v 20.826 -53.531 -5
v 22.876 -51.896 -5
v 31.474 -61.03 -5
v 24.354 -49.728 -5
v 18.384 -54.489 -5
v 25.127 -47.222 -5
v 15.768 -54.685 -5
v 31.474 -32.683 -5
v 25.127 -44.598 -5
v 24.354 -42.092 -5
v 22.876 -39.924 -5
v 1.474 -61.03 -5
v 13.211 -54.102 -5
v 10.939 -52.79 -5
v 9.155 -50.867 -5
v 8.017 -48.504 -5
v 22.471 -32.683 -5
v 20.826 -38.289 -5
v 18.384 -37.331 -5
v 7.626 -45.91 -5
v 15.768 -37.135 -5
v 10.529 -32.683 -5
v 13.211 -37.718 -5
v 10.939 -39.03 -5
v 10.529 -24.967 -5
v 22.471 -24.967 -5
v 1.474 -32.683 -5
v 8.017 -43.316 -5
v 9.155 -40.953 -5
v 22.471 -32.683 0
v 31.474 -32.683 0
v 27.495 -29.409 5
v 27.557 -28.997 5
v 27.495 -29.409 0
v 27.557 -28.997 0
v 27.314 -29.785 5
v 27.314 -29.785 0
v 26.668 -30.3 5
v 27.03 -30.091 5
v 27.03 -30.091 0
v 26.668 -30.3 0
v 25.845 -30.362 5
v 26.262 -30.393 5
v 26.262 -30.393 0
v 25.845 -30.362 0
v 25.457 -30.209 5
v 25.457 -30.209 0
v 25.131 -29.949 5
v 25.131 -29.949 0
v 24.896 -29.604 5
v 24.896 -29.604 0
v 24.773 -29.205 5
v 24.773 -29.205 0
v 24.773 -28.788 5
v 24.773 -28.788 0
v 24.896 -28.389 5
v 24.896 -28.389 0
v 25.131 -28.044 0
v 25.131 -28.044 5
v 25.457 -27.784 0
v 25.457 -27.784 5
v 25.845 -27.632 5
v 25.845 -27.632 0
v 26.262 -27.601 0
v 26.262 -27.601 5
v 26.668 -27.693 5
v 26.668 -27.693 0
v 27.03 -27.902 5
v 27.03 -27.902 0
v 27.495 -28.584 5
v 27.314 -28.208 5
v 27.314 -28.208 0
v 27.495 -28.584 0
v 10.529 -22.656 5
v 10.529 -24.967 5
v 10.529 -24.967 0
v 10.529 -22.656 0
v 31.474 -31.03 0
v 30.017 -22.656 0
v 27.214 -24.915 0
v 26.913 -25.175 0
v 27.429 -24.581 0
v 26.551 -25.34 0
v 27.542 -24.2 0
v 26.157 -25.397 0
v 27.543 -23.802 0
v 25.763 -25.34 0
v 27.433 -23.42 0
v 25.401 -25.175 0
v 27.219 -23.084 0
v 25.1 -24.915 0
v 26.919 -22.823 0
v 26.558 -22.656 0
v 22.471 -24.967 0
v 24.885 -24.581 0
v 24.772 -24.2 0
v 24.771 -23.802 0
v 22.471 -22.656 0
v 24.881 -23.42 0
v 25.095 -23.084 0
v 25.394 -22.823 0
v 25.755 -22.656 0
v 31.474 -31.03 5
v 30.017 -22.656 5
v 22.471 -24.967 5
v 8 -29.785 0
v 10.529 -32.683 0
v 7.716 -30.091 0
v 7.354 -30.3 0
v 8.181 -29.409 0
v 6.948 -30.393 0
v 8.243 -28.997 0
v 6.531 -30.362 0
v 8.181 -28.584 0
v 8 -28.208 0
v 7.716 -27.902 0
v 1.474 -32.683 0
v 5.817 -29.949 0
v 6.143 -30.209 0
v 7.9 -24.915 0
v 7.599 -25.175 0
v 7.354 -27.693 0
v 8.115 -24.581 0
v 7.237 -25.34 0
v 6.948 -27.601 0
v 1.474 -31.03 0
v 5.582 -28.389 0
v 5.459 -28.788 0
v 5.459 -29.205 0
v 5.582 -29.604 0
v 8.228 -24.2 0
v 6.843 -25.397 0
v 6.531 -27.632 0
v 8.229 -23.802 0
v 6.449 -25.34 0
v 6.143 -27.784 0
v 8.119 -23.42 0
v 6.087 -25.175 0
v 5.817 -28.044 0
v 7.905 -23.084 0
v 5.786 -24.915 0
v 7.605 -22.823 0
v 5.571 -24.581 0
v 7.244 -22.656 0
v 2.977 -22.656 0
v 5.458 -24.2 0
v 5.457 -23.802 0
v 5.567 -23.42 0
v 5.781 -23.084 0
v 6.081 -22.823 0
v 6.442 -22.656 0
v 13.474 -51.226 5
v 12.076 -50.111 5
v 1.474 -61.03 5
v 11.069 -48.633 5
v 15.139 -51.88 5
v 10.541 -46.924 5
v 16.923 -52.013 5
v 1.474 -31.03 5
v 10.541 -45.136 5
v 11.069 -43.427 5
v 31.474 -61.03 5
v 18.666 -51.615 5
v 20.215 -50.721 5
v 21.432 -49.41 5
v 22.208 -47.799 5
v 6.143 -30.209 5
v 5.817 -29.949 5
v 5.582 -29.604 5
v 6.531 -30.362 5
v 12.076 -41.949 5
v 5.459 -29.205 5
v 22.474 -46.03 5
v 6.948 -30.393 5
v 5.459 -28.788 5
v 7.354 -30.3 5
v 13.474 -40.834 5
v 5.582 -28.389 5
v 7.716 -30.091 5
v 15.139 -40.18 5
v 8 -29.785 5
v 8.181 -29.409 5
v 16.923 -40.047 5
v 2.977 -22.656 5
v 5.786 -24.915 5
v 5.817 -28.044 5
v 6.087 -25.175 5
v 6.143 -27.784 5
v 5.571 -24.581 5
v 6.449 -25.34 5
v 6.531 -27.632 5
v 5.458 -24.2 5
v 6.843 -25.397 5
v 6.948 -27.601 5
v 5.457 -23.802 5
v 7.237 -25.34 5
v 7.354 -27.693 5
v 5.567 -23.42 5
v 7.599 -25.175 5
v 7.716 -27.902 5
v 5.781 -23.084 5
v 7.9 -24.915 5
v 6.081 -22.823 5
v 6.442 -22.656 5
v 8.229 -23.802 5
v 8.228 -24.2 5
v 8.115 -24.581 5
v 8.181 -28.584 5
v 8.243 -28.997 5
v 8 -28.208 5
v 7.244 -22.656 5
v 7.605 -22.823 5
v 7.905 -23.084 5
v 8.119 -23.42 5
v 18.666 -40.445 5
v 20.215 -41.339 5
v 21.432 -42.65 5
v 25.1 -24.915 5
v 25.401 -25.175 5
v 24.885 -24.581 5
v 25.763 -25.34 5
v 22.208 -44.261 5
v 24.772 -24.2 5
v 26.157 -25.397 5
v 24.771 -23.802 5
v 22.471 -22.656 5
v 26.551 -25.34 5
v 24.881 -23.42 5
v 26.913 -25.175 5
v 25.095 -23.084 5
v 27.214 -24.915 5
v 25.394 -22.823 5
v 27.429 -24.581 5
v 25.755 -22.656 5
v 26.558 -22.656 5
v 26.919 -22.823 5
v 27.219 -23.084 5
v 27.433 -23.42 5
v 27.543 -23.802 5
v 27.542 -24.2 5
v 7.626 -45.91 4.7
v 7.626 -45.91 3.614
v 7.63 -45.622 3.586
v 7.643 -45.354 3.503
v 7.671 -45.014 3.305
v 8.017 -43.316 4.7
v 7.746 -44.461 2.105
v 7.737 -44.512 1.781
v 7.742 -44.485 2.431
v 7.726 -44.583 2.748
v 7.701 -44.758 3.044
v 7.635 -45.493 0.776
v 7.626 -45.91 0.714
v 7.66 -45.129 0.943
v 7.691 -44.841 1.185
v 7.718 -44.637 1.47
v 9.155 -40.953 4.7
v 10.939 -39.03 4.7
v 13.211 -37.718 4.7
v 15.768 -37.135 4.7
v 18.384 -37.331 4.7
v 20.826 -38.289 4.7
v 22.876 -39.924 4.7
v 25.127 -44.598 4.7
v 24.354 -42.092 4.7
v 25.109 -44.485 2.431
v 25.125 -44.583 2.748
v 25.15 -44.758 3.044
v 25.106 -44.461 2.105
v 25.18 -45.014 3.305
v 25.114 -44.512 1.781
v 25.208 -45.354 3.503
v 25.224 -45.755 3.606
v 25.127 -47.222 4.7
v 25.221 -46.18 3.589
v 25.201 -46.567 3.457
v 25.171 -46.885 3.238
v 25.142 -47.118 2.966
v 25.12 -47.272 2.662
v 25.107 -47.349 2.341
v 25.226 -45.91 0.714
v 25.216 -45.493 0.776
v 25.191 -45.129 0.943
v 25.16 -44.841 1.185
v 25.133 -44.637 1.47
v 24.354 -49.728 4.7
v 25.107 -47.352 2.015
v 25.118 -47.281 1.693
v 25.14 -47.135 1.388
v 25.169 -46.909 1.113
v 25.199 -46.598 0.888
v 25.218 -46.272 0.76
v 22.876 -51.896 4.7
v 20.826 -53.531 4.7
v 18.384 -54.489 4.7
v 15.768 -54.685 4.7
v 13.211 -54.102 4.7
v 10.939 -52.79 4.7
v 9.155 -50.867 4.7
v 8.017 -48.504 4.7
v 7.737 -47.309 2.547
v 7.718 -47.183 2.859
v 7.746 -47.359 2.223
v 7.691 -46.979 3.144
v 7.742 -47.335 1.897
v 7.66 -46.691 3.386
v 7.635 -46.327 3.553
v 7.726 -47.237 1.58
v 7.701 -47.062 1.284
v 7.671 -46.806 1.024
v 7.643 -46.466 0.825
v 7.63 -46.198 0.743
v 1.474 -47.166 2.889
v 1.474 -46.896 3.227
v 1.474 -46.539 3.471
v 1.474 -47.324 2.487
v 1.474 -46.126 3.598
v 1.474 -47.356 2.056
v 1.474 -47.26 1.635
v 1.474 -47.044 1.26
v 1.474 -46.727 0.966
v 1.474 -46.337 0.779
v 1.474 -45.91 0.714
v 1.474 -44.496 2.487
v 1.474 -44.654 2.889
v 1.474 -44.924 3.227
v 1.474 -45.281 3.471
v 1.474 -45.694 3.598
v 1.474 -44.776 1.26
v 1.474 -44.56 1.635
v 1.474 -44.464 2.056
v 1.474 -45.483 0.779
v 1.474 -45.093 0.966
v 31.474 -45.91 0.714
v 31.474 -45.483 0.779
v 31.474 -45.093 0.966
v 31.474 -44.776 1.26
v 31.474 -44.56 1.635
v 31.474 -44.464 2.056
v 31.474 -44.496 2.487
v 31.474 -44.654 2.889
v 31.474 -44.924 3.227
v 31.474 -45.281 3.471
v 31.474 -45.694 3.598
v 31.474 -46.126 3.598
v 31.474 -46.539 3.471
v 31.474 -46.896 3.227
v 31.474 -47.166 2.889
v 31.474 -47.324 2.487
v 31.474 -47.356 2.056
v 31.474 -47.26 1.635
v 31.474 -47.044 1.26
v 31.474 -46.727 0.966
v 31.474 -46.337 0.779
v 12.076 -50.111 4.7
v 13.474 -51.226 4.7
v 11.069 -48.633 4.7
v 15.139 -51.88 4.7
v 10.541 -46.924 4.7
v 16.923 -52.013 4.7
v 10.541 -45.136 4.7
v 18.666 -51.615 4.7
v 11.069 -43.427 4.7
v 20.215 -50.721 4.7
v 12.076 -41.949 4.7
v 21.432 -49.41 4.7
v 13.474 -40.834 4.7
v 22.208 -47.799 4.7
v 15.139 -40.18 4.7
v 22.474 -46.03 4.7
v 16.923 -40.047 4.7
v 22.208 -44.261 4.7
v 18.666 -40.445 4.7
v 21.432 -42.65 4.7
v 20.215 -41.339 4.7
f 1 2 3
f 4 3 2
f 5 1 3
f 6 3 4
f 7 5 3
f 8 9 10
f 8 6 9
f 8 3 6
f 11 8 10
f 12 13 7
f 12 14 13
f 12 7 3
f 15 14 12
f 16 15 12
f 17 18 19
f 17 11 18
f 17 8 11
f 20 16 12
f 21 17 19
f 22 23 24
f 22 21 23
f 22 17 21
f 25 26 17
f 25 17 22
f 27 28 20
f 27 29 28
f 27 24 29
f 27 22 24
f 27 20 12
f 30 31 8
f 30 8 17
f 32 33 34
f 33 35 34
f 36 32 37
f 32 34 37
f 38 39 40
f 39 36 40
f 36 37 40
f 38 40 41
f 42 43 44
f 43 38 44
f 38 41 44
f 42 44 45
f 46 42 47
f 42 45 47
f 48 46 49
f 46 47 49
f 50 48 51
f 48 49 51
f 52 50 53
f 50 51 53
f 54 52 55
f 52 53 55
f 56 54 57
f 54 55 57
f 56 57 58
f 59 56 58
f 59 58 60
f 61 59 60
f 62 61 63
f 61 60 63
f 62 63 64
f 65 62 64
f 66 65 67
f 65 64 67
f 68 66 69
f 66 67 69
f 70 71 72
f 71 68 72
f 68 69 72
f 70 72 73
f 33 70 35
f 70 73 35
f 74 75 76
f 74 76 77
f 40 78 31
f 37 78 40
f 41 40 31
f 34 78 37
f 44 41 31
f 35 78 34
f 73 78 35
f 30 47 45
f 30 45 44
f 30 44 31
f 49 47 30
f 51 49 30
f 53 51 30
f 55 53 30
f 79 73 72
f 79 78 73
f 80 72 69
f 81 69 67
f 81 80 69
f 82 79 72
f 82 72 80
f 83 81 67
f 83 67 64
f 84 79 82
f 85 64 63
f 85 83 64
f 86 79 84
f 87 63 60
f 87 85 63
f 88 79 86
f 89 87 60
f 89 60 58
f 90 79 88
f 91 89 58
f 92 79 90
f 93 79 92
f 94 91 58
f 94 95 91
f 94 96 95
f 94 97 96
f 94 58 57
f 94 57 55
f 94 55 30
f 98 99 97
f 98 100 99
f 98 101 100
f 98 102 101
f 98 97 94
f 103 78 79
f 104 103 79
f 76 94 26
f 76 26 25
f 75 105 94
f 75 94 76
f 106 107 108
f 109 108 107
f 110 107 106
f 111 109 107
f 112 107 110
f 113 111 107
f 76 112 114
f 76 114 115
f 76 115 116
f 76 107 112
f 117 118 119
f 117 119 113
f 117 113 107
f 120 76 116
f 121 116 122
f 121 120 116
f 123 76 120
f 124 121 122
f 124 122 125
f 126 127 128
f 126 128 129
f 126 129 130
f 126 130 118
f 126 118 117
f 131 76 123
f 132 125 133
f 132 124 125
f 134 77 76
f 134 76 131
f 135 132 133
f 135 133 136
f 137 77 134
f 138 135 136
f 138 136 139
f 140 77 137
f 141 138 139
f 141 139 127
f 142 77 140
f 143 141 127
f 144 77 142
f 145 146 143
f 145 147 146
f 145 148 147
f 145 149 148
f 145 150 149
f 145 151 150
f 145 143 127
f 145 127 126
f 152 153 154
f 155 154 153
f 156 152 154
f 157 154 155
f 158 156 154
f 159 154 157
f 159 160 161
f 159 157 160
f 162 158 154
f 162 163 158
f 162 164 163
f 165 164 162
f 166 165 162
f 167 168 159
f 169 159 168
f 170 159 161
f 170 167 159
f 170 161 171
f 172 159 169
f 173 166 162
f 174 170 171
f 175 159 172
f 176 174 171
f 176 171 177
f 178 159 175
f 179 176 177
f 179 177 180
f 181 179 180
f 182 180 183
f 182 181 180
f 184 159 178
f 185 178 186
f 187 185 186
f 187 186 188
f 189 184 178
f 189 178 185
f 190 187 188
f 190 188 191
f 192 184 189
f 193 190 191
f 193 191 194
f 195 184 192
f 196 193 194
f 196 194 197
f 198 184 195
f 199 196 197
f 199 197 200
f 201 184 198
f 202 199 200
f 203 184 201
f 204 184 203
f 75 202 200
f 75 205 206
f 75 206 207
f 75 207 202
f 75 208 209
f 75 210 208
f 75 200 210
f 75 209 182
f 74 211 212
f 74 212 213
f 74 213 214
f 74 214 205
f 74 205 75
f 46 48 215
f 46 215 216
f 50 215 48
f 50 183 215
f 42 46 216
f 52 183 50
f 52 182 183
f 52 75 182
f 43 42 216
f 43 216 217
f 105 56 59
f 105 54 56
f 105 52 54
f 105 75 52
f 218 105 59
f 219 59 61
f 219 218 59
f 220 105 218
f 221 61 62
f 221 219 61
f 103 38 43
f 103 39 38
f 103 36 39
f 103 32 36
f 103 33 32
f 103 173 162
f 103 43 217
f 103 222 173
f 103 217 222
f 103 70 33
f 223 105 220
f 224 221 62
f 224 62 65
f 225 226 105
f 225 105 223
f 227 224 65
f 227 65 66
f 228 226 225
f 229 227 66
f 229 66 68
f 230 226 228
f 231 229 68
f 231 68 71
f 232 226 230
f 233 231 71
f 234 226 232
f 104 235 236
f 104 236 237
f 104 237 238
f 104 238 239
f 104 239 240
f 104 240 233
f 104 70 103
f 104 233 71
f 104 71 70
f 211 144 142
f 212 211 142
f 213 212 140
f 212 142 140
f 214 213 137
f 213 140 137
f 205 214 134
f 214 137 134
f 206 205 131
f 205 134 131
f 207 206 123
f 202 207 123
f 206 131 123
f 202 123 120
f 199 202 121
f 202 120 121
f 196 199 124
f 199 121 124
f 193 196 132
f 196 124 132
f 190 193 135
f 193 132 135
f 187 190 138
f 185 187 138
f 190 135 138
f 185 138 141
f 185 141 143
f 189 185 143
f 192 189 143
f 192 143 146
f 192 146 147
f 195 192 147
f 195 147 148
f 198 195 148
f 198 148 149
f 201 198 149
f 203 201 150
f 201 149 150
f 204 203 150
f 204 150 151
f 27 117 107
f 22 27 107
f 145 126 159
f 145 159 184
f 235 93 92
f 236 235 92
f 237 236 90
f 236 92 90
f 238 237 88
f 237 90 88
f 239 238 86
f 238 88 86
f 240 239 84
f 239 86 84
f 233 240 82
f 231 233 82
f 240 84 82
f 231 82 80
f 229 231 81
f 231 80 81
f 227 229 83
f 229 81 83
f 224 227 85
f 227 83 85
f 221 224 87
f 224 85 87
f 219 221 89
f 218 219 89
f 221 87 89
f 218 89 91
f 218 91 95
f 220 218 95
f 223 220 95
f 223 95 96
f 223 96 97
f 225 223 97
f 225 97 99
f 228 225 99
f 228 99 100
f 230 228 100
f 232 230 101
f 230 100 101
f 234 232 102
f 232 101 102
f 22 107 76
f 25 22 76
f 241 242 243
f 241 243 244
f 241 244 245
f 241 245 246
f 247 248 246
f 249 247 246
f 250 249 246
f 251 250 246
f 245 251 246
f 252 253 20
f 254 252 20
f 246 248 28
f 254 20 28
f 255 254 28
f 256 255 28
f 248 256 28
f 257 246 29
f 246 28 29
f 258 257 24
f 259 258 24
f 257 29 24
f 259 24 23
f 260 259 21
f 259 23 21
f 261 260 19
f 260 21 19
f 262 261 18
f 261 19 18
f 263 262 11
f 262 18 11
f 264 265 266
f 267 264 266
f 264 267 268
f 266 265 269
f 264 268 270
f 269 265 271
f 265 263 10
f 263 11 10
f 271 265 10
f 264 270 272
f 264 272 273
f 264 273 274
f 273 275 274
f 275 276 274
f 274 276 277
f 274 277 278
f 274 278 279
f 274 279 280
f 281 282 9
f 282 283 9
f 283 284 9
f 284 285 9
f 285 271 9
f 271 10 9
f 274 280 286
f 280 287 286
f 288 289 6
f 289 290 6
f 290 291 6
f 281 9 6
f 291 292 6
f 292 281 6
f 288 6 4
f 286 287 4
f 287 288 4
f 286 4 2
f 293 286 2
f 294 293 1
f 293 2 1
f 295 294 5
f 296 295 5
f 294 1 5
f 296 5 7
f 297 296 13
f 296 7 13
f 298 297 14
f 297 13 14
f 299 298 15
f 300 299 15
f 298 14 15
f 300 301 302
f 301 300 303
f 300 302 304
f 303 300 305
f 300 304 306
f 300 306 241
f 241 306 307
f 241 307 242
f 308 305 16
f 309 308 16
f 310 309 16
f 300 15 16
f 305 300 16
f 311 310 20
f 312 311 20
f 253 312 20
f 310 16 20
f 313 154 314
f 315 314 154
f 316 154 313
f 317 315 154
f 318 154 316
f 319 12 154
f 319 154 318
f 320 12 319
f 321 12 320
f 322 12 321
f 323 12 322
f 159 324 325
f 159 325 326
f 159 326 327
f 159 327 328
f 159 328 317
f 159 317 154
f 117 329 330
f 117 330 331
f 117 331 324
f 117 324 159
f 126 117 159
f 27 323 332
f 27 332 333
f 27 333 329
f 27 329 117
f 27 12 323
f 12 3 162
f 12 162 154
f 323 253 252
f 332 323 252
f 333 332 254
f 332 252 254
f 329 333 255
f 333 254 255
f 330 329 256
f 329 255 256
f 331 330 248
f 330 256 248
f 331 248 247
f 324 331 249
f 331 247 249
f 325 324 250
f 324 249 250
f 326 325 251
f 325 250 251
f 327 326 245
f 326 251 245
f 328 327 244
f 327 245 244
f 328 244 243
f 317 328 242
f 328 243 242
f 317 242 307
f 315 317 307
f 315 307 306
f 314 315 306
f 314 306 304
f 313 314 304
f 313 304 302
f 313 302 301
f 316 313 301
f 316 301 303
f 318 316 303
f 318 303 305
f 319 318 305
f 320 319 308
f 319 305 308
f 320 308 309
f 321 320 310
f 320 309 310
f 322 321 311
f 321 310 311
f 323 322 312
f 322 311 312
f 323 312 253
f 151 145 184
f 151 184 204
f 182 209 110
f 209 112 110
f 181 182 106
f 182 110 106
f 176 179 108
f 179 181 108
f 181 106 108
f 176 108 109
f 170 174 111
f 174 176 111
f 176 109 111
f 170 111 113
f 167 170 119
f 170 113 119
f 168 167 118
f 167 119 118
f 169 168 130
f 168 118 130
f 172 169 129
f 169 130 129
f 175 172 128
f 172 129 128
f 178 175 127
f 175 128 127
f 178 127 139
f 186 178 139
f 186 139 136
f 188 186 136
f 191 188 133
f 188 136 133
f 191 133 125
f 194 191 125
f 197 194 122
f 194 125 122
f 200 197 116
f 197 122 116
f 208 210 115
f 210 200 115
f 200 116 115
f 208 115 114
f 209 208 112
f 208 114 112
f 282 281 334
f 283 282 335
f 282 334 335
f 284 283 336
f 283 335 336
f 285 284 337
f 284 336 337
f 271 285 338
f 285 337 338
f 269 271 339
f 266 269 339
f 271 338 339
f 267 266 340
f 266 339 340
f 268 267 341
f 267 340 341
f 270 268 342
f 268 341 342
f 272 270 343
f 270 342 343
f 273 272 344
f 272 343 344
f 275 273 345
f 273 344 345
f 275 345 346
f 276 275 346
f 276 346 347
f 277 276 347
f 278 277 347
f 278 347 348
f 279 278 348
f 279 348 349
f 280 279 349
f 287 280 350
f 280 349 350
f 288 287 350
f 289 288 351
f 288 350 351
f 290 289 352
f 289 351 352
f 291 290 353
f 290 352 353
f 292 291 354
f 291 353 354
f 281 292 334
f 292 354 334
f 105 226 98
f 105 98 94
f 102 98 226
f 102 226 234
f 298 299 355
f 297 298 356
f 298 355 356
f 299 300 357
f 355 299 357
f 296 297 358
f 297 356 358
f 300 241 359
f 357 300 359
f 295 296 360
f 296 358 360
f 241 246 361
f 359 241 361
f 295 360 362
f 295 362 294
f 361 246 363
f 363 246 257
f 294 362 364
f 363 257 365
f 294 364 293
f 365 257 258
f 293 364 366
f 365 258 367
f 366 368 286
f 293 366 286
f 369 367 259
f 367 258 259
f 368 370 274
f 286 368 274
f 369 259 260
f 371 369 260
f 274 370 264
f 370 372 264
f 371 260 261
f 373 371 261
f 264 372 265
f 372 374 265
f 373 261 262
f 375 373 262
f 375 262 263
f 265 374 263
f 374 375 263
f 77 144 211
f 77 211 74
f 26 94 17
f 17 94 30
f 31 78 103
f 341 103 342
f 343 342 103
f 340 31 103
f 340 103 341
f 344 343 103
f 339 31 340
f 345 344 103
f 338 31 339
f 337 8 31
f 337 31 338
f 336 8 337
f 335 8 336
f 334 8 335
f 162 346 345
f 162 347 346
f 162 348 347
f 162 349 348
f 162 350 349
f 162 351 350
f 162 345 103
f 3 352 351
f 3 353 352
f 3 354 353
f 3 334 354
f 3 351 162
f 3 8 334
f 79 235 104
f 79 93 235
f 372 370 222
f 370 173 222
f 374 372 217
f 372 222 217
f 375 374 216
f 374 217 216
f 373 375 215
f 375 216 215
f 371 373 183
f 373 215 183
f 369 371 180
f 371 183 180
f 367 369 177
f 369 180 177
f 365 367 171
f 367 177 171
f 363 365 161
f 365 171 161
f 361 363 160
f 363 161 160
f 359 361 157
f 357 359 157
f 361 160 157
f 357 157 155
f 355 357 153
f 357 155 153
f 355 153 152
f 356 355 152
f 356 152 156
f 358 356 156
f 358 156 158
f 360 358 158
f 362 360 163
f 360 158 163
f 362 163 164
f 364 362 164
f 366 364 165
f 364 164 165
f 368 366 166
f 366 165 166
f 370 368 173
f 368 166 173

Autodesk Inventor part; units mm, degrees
ref_plane "YZ Plane" through (0, 0, 0) normal (1, 0, 0) x (0, 1, 0)
ref_plane "XZ Plane" through (0, 0, 0) normal (0, 1, 0) x (-1, 0, 0)
ref_plane "XY Plane" through (0, 0, 0) normal (0, 0, 1) x (1, 0, 0)
ref_plane "Work Plane1" through (0, 0, 0) normal (0, 0, 1) x (1, 0, 0)
sketch "Sketch1" plane through (0, 0, 0) normal (0, 0, 1) x (1, 0, 0)
  circle A0 centre (6.843, -28.9967) radius 1.4 projected
  circle A1 centre (26.1569, -28.9967) radius 1.4 projected
  circle A2 centre (26.1569, -23.9967) radius 1.4 projected
  circle A3 centre (6.843, -23.9967) radius 1.4 projected
  line L0 (0.4643, -12) -> (0, -12) construction
  line L1 (3.1567, -14.6923) -> (0.4643, -12) construction
  line L2 (3.1567, -32.6831) -> (3.1567, -14.6923) construction
  line L3 (10.5294, -32.6831) -> (3.1567, -32.6831) projected
  line L4 (10.5294, -14.6923) -> (10.5294, -32.6831) construction
  line L5 (9, -11) -> (10.5294, -14.6923) construction
  line L6 (2.8, -11) -> (9, -11) construction
  line L7 (2.8, 0) -> (2.8, -11) construction
  line L8 (30.2, 0) -> (2.8, 0) construction
  line L9 (30.2, 0) -> (30.2, -11) construction
  line L10 (24, -11) -> (30.2, -11) construction
  line L11 (24, -11) -> (22.4706, -14.6923) construction
  line L12 (22.4706, -14.6923) -> (22.4706, -32.6831) construction
  line L13 (22.4706, -32.6831) -> (29.8433, -32.6831) projected
  line L14 (29.8433, -32.6831) -> (29.8433, -14.6923) construction
  line L15 (29.8433, -14.6923) -> (32.5357, -12) construction
  line L16 (33, -12) -> (32.5357, -12) construction
  line L17 (33, -12) -> (33, 5) construction
  line L18 (0, 5) -> (0, -12) construction
  circle A4 centre (16.4744, -46.03) radius 10 projected
  circle A5 centre (16.4744, -46.03) radius 12.5
  line L19 (31.4744, -31.03) -> (1.4744, -31.03) construction
  line L20 (1.4744, -31.03) -> (1.4744, -61.03) construction
  line L21 (1.4744, -61.03) -> (31.4744, -61.03) construction
  line L22 (31.4744, -61.03) -> (31.4744, -31.03) construction
  line L23 (31.4744, -31.03) -> (1.4744, -61.03) construction
  line L24 (1.4744, -31.03) -> (31.4744, -61.03) construction
  line L25 (31.4744, -61.03) -> (1.4744, -61.03)
  line L26 (1.4744, -61.03) -> (1.4744, -31.03)
  line L27 (1.4744, -31.03) -> (31.4744, -31.03)
  line L28 (31.4744, -31.03) -> (31.4744, -61.03)
  line L29 (31.4744, -61.03) -> (1.4744, -31.03) construction
  line L30 (1.4744, -61.03) -> (31.4744, -31.03) construction
  line L31 (1.4744, -31.03) -> (3.1567, -21.6555)
  line L32 (3.1567, -21.6555) -> (29.8433, -21.6555)
  line L33 (31.4744, -31.03) -> (29.8433, -21.6555)
  circle A6 centre (15.4444, 14.8) radius 2 projected
  line L34 (19.4444, 18.8) -> (33, 5) projected
  line L35 (11.4444, 18.8) -> (19.4444, 18.8) projected
  line L36 (0, 5) -> (11.4444, 18.8) projected
  circle A7 centre (3.9444, 3.3) radius 1.45 projected
  circle A8 centre (26.9444, 3.3) radius 1.45 projected
  point P0 (0, 0)
  dimension "d0" = 25
  dimension "d1" = 30
  dimension "d2" = 30
extrude "Extrusion1" add sketch "Sketch1" along normal blind 5 contours L25 L26 L27 L28 | L27 L31 L32 L33
sketch "Sketch2" plane through (0, 0, 0) normal (0, 0, -1) x (-1, 0, 0)
  circle A0 centre (-16.4744, -46.03) radius 12.5 projected
  circle A1 centre (-16.4744, -46.03) radius 10.5
  line L0 (0.4956, -63) -> (-33.4444, -63) projected
  circle A2 centre (-16.4744, -46.03) radius 12.5 projected
  arc A3 (-23.9744, -56.03) -> (-8.9744, -56.03) centre (-16.4744, -46.03) ccw
  arc A4 (-21.3847, -34.5348) -> (-28.8847, -47.5252) centre (-16.4744, -46.03) ccw
  arc A5 (-4.0642, -47.5252) -> (-11.5642, -34.5348) centre (-16.4744, -46.03) ccw
  point P0 (0, 0)
  dimension "d5" = 21
extrude "Extrusion2" add sketch "Sketch2" against normal up to surface (5 mm away)
sketch "Sketch3" plane through (0, 0, 0) normal (0, 0, -1) x (-1, 0, 0)
  line L0 (-30.5357, -14) -> (-24, -14) construction
  line L1 (-30.5357, -14) -> (-29.8433, -14.6923) construction
  line L2 (-29.8433, -14.6923) -> (-29.8433, -32.6831) construction
  line L3 (-29.8433, -32.6831) -> (-22.4706, -32.6831) projected
  line L4 (-22.4706, -32.6831) -> (-10.5294, -32.6831)
  line L5 (-10.5294, -32.6831) -> (-10.5294, -22.0651)
  line L6 (-10.5294, -22.0651) -> (-22.4706, -22.0651)
  line L7 (-22.4706, -22.0651) -> (-22.4706, -32.6831)
  circle A0 centre (-6.843, -23.9967) radius 1.4 construction
  circle A1 centre (-26.1569, -23.9967) radius 1.4 construction
  circle A2 centre (-26.1569, -28.9967) radius 1.4 construction
  circle A3 centre (-6.843, -28.9967) radius 1.4 construction
  line L8 (-3.1567, -21.6555) -> (-1.4744, -31.03) construction
  line L9 (-29.8433, -21.6555) -> (-3.1567, -21.6555) construction
  line L10 (-31.4744, -31.03) -> (-29.8433, -21.6555) construction
  line L11 (-31.4744, -61.03) -> (-31.4744, -31.03) construction
  line L12 (-1.4744, -61.03) -> (-31.4744, -61.03) projected
  line L13 (-1.4744, -31.03) -> (-1.4744, -61.03) construction
  line L14 (-31.4744, -32.6831) -> (-29.8433, -32.6831)
  line L15 (-3.1567, -32.6831) -> (-1.4744, -32.6831)
  line L16 (-31.4744, -61.03) -> (-1.4744, -61.03)
  line L17 (-1.4744, -61.03) -> (-1.4744, -32.6831)
  line L18 (-1.4744, -32.6831) -> (-31.4744, -32.6831)
  line L19 (-31.4744, -32.6831) -> (-31.4744, -61.03)
  circle A4 centre (-26.1569, -28.9967) radius 1.4 projected
  circle A5 centre (-26.1569, -23.9967) radius 1.4 projected
  line L20 (-24, -14) -> (-24, -11) projected
  line L21 (-22.4706, -32.6831) -> (-22.4706, -14.6923) projected
  line L22 (-22.4706, -14.6923) -> (-24, -11) projected
  circle A6 centre (-16.4256, -45.91) radius 10.6939 projected
  point P0 (0, 0)
extrude "Extrusion4" add sketch "Sketch3" along normal blind 5 contours L3 L4 L18 L15 L17 L12 L19 L14 | L7 L6 L5 L4
sketch "Sketch4" plane through (3.1567, -21.6555, 0) normal (0, 1, 0) x (1, 0, 0)
  line L0 (-6.8596, 8.2929) -> (32.2101, 8.2929)
  line L1 (32.2101, 8.2929) -> (32.2101, -9.1799)
  line L2 (32.2101, -9.1799) -> (-6.8596, -9.1799)
  line L3 (-6.8596, -9.1799) -> (-6.8596, 8.2929)
  point P0 (-3.1567, 0)
extrude "Extrusion5" cut sketch "Sketch4" against normal blind 1
sketch "Sketch5" plane through (0, 0, 5) normal (0, 0, 1) x (1, 0, 0)
  circle A0 centre (6.843, -28.9967) radius 1.4 projected
  circle A1 centre (26.1569, -28.9967) radius 1.4 projected
  line L0 (25.7553, -22.6555) -> (7.2447, -22.6555) projected
  arc A2 (6.4414, -22.6555) -> (7.2447, -22.6555) centre (6.843, -23.9967) ccw projected
  line L1 (6.4414, -22.6555) -> (2.9772, -22.6555) projected
  line L2 (2.9772, -22.6555) -> (1.4744, -31.03) projected
  line L3 (1.4744, -31.03) -> (1.4744, -61.03) projected
  line L4 (1.4744, -61.03) -> (31.4744, -61.03) projected
  line L5 (31.4744, -61.03) -> (31.4744, -31.03) projected
  line L6 (31.4744, -31.03) -> (30.0173, -22.6555) projected
  line L7 (30.0173, -22.6555) -> (26.5586, -22.6555) projected
  arc A3 (25.7553, -22.6555) -> (26.5586, -22.6555) centre (26.1569, -23.9967) ccw projected
  line L8 (10.5294, -20.3437) -> (22.4706, -20.3437)
  line L9 (22.4706, -20.3437) -> (22.4706, -24.9674)
  line L10 (22.4706, -24.9674) -> (10.5294, -24.9674)
  line L11 (10.5294, -24.9674) -> (10.5294, -20.3437)
  line L12 (10.5294, -22.6555) -> (22.4706, -22.6555) projected
  line L13 (10.5294, -20.3437) -> (22.4706, -24.9674) construction
  line L14 (22.4706, -20.3437) -> (10.5294, -24.9674) construction
  point P0 (0, 0)
  point P1 (16.5, -22.6555)
extrude "Extrusion6" cut sketch "Sketch5" against normal through all contours L9 L10 L11 L0 | L0 L11 L8 L9
ref_plane "Work Plane2" through (16.4744, -61.03, 5) normal (1, 0, 0) x (0, 0, -1)
sketch "Sketch6" plane through (16.4744, -61.03, 5) normal (1, 0, 0) x (0, 0, -1)
  line L0 (0, 5.17) -> (0.15, 5.17)
  line L1 (0, 5.17) -> (0.15, 5.17) construction
  line L2 (0.15, 5.17) -> (0.3567, 4.812)
  line L3 (0.3567, 4.812) -> (0.5067, 4.812)
  line L4 (0.5067, 4.812) -> (0.7133, 5.17)
  line L5 (0.7133, 5.17) -> (0.7133, 4.17)
  line L6 (0.7133, 4.17) -> (0, 4.17)
  line L7 (0, 4.17) -> (0, 5.17)
  line L8 (-2, 15.12) -> (12, 15.12) projected
  point P0 (5, 61.03)
  point P1 (0, 0)
  dimension "d16" = 0.15
  dimension "d17" = 0
  dimension "d18" = 120
  dimension "d19" = 0.15
  dimension "d20" = 120
  dimension "d21" = 1
  dimension "d22" = 0.7133
  dimension "d33" = 9.95
coil "Coil1" sketch "Sketch6" operation add axis through (16.4744, -45.91, 0) along (0, 0, -1) pitch 0.7133 turns 13 hand right
sketch "Sketch7" plane through (0, 0, 5) normal (0, 0, 1) x (1, 0, 0)
  circle A0 centre (16.4744, -46.03) radius 10.5 projected
  circle A1 centre (16.4744, -46.03) radius 6
  point P0 (0, 0)
  point P1 (16.4744, -56.53)
  dimension "d34" = 12
extrude "Extrusion7" add sketch "Sketch7" against normal blind 0.3
sketch "Sketch8" plane through (0, 0, -5) normal (0, 0, -1) x (-1, 0, 0)
  circle A0 centre (-16.4256, -45.91) radius 10.6939 projected
  circle A1 centre (-16.4256, -45.91) radius 8.8
  point P0 (0, 0)
  dimension "d37" = 17.6
extrude "Extrusion8" add sketch "Sketch8" against normal up to surface (9.7 mm away)
sketch "Sketch9" plane through (31.4744, -61.03, 5) normal (1, 0, 0) x (0, 0, -1)
  line L0 (0.3, 6.32) -> (0.3, 23.92) projected
  line L1 (10, 23.92) -> (10, 6.32) projected
  circle A0 centre (2.8356, 15.12) radius 1.45
  point P0 (5, 61.03)
  dimension "d40" = 2.9
extrude "Extrusion9" cut sketch "Sketch9" against normal through all
equation "\"d19\" = d16"
equation "\"d20\" = d18"
properties part number "30_Cube_Z_Focus_MGN_NEMA_adapter_M12"
